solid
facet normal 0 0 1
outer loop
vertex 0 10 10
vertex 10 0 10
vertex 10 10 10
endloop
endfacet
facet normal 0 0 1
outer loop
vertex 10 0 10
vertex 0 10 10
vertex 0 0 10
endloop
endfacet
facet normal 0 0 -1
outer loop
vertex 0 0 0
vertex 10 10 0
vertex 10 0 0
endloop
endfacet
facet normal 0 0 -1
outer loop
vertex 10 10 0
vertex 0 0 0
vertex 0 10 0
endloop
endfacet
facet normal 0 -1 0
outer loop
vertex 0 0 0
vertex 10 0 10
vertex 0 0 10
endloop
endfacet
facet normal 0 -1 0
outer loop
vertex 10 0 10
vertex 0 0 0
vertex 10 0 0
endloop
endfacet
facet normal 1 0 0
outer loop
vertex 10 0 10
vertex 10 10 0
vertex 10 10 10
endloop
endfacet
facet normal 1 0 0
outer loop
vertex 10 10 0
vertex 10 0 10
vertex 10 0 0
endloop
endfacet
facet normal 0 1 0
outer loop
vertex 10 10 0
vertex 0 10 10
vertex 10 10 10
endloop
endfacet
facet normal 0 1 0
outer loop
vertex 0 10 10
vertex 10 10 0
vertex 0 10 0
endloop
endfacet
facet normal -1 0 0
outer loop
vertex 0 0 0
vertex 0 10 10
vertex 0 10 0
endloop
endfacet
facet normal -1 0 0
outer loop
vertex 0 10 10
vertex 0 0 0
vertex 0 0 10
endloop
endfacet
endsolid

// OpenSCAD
/*
 * The background modifier (%) shows the object as it would be had you proceeded with your actions.
 */

cube([10, 10, 10]);

%translate([5, 5, 5]) // Cube drawn in grey and not actually rendered.
    cube([10, 10, 10]);
